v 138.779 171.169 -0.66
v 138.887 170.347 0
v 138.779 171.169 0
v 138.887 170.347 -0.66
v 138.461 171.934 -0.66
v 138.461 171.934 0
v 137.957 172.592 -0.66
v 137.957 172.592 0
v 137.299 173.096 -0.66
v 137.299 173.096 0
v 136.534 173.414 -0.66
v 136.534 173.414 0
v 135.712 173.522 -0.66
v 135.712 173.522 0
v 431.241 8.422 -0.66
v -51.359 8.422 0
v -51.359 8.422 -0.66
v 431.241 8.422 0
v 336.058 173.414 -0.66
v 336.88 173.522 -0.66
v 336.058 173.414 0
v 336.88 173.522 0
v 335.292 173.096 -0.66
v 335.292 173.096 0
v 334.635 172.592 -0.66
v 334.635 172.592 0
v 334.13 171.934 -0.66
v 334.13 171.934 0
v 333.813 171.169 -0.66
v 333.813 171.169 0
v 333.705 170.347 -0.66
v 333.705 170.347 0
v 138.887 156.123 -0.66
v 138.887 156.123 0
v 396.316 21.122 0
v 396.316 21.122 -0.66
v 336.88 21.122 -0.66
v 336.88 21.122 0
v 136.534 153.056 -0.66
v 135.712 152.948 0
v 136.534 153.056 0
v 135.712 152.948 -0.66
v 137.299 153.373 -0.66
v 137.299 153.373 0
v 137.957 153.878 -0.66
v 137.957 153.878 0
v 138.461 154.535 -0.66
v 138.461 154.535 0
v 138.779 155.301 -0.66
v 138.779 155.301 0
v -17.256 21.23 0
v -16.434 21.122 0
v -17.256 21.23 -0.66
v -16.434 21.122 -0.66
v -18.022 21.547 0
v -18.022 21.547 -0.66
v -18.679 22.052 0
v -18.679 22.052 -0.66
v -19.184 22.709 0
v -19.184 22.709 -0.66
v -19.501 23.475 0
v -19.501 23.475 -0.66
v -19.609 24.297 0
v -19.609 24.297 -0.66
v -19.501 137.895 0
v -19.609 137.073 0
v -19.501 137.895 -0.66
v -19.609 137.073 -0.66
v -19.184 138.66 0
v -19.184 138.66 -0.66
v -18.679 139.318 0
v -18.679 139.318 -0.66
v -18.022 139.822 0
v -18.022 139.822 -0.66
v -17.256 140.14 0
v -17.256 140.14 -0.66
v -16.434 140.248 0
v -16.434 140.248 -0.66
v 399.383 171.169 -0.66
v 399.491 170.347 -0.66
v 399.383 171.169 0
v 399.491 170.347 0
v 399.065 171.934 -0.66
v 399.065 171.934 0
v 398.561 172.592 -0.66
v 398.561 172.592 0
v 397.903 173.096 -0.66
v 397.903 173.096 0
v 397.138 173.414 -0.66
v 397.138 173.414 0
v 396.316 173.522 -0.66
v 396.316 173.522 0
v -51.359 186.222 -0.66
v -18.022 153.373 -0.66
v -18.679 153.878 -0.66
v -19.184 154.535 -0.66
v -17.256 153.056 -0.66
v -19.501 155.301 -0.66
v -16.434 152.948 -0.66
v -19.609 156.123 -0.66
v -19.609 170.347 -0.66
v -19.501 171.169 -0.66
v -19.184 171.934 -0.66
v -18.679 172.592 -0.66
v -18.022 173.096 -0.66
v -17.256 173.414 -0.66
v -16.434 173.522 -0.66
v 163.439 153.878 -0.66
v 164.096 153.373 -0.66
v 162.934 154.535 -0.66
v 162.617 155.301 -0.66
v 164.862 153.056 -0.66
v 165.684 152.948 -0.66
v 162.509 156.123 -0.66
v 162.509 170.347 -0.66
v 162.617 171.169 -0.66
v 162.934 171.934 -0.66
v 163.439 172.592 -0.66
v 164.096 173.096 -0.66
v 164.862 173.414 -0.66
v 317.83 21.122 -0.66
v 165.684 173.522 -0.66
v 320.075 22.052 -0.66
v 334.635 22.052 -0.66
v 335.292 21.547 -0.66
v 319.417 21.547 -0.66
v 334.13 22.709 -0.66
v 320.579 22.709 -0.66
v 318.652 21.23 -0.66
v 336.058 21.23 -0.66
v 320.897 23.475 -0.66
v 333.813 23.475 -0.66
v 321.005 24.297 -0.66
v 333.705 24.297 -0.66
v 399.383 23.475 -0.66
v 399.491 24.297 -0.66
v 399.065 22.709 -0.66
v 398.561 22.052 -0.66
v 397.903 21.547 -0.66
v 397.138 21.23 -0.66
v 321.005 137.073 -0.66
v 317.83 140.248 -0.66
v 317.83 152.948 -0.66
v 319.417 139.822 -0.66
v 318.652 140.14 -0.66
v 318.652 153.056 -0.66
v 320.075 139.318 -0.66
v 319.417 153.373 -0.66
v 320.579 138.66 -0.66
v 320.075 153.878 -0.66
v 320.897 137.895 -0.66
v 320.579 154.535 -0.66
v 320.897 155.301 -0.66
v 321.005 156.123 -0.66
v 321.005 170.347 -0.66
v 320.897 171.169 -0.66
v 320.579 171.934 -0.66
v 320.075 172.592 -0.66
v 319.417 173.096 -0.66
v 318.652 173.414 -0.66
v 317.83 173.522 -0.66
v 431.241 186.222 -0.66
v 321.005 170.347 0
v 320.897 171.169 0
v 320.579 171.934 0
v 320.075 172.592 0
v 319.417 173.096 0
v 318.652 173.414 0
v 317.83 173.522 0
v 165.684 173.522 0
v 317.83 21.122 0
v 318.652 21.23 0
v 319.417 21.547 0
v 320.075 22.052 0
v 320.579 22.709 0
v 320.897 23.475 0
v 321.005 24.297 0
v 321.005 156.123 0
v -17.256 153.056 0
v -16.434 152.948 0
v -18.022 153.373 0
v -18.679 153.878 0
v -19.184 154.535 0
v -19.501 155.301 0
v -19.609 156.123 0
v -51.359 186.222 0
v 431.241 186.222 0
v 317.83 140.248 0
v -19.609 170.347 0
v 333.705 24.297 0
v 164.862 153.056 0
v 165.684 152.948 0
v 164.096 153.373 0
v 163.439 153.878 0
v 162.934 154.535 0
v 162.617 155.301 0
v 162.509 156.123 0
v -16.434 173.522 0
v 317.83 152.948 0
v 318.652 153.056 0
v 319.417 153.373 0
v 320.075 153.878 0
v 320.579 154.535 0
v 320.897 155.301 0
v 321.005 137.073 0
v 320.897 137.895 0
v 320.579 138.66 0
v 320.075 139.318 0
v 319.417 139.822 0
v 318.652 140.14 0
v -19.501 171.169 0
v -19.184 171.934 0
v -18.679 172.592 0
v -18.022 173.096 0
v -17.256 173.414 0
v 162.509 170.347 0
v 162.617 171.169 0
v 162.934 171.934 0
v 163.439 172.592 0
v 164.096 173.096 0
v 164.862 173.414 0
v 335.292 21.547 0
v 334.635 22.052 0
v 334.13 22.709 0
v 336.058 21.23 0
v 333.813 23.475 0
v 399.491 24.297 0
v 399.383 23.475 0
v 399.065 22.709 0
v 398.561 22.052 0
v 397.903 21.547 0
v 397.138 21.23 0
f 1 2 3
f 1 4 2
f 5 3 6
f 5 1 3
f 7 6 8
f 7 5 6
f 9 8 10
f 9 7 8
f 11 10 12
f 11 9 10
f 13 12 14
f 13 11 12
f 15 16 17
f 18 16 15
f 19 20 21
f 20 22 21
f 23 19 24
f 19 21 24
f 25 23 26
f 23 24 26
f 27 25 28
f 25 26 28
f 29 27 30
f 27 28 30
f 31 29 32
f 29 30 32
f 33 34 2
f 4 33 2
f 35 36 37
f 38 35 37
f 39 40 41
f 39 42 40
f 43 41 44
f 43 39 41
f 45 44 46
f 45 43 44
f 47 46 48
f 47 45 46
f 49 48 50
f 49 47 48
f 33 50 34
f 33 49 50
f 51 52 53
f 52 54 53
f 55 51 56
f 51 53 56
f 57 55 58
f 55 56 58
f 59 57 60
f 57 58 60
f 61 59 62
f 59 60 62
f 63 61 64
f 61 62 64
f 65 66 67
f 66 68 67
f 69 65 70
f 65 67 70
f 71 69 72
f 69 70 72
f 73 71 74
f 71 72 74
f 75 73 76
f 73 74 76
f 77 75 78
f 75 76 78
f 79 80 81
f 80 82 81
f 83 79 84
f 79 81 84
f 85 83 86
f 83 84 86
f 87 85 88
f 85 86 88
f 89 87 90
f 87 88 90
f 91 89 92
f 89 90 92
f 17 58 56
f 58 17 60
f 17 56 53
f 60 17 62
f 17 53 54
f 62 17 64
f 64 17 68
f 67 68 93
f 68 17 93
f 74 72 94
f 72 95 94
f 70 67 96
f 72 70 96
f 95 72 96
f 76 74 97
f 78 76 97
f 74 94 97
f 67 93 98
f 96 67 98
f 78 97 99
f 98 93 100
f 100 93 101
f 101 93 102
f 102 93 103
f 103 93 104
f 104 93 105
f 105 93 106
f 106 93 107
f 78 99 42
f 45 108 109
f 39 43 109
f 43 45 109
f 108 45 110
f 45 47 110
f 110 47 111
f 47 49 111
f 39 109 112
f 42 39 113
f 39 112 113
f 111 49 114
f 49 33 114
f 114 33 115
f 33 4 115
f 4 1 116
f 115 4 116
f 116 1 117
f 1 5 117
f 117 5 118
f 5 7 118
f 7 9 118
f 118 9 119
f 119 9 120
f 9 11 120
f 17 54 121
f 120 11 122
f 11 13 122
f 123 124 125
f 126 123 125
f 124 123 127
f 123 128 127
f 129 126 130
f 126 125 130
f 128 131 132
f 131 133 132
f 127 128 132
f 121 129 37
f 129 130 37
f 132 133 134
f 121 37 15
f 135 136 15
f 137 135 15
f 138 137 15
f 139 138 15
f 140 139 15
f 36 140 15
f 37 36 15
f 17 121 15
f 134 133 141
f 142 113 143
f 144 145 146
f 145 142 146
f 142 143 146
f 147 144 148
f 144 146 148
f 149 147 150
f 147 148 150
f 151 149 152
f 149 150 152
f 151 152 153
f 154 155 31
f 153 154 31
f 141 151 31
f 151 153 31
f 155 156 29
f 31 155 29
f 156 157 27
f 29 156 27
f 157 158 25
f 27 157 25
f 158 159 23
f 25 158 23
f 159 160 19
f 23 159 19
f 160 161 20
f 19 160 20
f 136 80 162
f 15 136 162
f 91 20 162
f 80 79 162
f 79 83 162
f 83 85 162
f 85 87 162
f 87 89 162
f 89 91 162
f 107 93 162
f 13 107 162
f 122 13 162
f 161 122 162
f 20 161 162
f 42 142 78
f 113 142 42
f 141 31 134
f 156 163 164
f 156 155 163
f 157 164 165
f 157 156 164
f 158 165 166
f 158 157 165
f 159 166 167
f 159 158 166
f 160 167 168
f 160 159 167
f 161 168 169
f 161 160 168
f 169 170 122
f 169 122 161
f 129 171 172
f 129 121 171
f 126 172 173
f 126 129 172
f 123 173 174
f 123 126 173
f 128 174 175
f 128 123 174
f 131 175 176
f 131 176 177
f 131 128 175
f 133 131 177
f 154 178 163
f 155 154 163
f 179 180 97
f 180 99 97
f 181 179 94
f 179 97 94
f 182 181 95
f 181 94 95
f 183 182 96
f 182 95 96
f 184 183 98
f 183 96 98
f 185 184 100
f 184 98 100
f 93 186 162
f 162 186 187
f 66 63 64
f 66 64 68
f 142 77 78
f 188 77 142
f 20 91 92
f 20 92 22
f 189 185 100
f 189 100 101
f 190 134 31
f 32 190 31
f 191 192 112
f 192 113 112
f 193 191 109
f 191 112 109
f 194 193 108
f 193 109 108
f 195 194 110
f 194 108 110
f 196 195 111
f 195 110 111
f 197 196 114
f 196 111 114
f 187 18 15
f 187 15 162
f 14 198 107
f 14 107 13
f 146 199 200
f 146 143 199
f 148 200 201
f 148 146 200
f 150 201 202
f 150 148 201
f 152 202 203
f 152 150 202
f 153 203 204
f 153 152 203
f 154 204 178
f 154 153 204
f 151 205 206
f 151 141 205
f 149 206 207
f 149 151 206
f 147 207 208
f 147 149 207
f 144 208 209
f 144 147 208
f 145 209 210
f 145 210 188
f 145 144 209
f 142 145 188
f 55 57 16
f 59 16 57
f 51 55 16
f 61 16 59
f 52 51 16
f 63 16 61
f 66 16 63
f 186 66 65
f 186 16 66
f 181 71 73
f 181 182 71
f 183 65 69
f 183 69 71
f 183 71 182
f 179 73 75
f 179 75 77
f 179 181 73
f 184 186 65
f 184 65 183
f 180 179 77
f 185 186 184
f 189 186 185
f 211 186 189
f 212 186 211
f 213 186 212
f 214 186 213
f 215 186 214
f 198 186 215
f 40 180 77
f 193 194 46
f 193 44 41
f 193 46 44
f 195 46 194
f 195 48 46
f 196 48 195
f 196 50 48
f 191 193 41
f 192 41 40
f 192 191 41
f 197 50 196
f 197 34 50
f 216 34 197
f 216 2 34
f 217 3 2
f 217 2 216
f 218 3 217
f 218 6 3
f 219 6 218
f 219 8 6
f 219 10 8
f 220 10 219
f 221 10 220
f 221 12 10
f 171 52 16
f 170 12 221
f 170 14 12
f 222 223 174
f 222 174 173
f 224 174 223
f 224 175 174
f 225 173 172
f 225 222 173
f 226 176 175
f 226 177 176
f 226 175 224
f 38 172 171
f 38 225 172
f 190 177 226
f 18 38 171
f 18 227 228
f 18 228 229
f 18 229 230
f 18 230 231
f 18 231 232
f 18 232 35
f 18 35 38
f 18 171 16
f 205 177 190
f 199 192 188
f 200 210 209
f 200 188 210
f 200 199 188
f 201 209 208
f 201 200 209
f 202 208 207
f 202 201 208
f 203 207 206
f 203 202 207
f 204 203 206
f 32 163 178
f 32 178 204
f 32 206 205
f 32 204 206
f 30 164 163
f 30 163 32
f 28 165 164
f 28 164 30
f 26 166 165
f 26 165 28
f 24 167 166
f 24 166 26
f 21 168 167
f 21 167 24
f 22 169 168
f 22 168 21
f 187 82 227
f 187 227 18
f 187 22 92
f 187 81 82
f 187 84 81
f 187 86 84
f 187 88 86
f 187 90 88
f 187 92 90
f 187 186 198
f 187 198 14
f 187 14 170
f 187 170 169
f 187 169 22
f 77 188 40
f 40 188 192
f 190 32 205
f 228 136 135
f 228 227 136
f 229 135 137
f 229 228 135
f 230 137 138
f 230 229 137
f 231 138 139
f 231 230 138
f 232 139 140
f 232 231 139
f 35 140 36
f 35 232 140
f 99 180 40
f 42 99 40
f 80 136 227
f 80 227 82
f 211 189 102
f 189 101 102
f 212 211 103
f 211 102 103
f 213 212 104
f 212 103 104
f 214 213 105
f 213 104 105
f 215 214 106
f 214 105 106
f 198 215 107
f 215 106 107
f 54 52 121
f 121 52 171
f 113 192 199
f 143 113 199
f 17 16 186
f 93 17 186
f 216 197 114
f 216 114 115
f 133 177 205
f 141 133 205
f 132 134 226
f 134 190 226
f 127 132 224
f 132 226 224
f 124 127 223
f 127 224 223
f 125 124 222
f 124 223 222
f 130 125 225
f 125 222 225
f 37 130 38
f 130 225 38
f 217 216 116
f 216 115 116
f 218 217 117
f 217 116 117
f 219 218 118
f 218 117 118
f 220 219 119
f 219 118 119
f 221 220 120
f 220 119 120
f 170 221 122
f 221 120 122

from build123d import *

# Parameters (mm, degrees)
SKETCH1_W          = 482.6
SKETCH1_H          = 177.8
BASE_FLANGE1_DEPTH = 0.6604
SKETCH2_W          = 158.496
SKETCH2_H          = 20.574
CUT_EXTRUDE1_DEPTH = 0.6604
LPATTERN1_COUNT    = 2
LPATTERN1_PITCH    = 182.118
SKETCH3_W          = 340.614
SKETCH3_H          = 119.126
CUT_EXTRUDE2_DEPTH = 0.6604
SKETCH4_W          = 65.786
SKETCH4_H          = 152.4
CUT_EXTRUDE3_DEPTH = 0.6604
FILLET1_R          = 3.175


# Sheet-metal steps are written as plain solids
with BuildPart() as part:
    # Sketch1 → Base-Flange1 (new body)
    with BuildSketch(Plane.XY):
        with Locations((189.940791832, 97.32180564)):
            Rectangle(SKETCH1_W, SKETCH1_H)
    extrude(amount=-BASE_FLANGE1_DEPTH)

    # Sketch2 → Cut-Extrude1 (cut)
    with BuildSketch(Plane.XY):
        with Locations((59.638791832, 163.23480564)):
            Rectangle(SKETCH2_W, SKETCH2_H)
    cut_extrude1 = extrude(amount=-CUT_EXTRUDE1_DEPTH, mode=Mode.SUBTRACT)

    # LPattern1: Cut-Extrude1 ×2
    with Locations(*[(i * LPATTERN1_PITCH, 0, 0) for i in range(1, LPATTERN1_COUNT)]):
        add(cut_extrude1, mode=Mode.SUBTRACT)

    # Sketch3 → Cut-Extrude2 (cut)
    with BuildSketch(Plane.XY):
        with Locations((150.697791832, 80.68480564)):
            Rectangle(SKETCH3_W, SKETCH3_H)
    extrude(amount=-CUT_EXTRUDE2_DEPTH, mode=Mode.SUBTRACT)

    # Sketch4 → Cut-Extrude3 (cut)
    with BuildSketch(Plane(origin=(0, 0, -0.6604), x_dir=(-1, 0, 0), z_dir=(0, 0, -1))):
        with Locations((-366.597791832, 97.32180564)):
            Rectangle(SKETCH4_W, SKETCH4_H)
    extrude(amount=-CUT_EXTRUDE3_DEPTH, mode=Mode.SUBTRACT)

    # Fillet1
    fillet1_edges = [part.edges().sort_by_distance(p)[0] for p in [
        (-19.609208168, 152.94780564, -0.3302),
        (-19.609208168, 173.52180564, -0.3302),
        (138.886791832, 173.52180564, -0.3302),
        (138.886791832, 152.94780564, -0.3302),
        (162.508791832, 152.94780564, -0.3302),
        (162.508791832, 173.52180564, -0.3302),
        (321.004791832, 173.52180564, -0.3302),
        (321.004791832, 152.94780564, -0.3302),
        (-19.609208168, 21.12180564, -0.3302),
        (-19.609208168, 140.24780564, -0.3302),
        (321.004791832, 140.24780564, -0.3302),
        (321.004791832, 21.12180564, -0.3302),
        (399.490791832, 21.12180564, -0.3302),
        (399.490791832, 173.52180564, -0.3302),
        (333.704791832, 173.52180564, -0.3302),
        (333.704791832, 21.12180564, -0.3302),
    ]]
    fillet(fillet1_edges, radius=FILLET1_R)


solid = part.part
